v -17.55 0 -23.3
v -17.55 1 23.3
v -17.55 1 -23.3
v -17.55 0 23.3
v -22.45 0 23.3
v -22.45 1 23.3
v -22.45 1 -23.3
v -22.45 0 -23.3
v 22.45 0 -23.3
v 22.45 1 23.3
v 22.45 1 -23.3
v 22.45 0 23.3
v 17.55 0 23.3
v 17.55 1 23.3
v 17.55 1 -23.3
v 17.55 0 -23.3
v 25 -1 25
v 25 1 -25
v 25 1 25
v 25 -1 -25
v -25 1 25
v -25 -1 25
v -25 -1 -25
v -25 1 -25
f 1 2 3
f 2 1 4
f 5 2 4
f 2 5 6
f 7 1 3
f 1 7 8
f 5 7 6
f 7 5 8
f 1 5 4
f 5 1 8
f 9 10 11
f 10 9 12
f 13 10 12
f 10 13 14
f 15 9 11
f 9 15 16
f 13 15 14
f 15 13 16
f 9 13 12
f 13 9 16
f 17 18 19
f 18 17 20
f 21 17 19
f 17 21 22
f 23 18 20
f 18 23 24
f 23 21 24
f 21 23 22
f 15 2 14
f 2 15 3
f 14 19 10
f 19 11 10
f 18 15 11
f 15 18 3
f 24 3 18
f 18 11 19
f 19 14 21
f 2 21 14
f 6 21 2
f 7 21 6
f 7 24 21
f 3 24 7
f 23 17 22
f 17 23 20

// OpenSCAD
// file: ../../../modules/scad/roundedcube.scad
// More information: https://danielupshaw.com/openscad-rounded-corners/


// Examples
// color("Yellow")
// roundedcube(3, true, 0.7, "xmin");

// translate(v = [1, 0, 2])
// color("Pink")
// roundedcube([4, 2, 2], false, 0.6, "zmax");

// translate(v = [-4, -1, 2])
// color("Lightblue")
// roundedcube(2, false);

// translate(v = [0, 0, 6])
// color("Orange")
// roundedcube([3, 2, 2], true, 0.2);

// translate(v = [2.5, -0.5, 5])
// color("Green")
// roundedcube([3, 2, 2], false, 0.4, "z");

// Set to 0.01 for higher definition curves (renders slower)
$fs = 0.15;

module roundedcube(size = [1, 1, 1], center = false, radius = 0.5, apply_to = "all") {
	// If single value, convert to [x, y, z] vector
	size = (size[0] == undef) ? [size, size, size] : size;

	translate_min = radius;
	translate_xmax = size[0] - radius;
	translate_ymax = size[1] - radius;
	translate_zmax = size[2] - radius;

	diameter = radius * 2;

	obj_translate = (center == false) ?
		[0, 0, 0] : [
			-(size[0] / 2),
			-(size[1] / 2),
			-(size[2] / 2)
		];

	translate(v = obj_translate) {
		hull() {
			for (translate_x = [translate_min, translate_xmax]) {
				x_at = (translate_x == translate_min) ? "min" : "max";
				for (translate_y = [translate_min, translate_ymax]) {
					y_at = (translate_y == translate_min) ? "min" : "max";
					for (translate_z = [translate_min, translate_zmax]) {
						z_at = (translate_z == translate_min) ? "min" : "max";

						translate(v = [translate_x, translate_y, translate_z])
						if (
							(apply_to == "all") ||
							(apply_to == "xmin" && x_at == "min") || (apply_to == "xmax" && x_at == "max") ||
							(apply_to == "ymin" && y_at == "min") || (apply_to == "ymax" && y_at == "max") ||
							(apply_to == "zmin" && z_at == "min") || (apply_to == "zmax" && z_at == "max")
						) {
							sphere(r = radius);
						} else {
							rotate = 
								(apply_to == "xmin" || apply_to == "xmax" || apply_to == "x") ? [0, 90, 0] : (
								(apply_to == "ymin" || apply_to == "ymax" || apply_to == "y") ? [90, 90, 0] :
								[0, 0, 0]
							);
							rotate(a = rotate)
							cylinder(h = diameter, r = radius, center = true);
						}
					}
				}
			}
		}
	}
}
// file: IKEA Skadis v2 hook cutouts.scad
skadis_hook_width = 4.5;
skadis_hook_height = 46;
skadis_hole_spacing_width = 40; // middle to middle
cutout_tolerance_w = 0.4;
cutout_tolerance_h = 0.6;


module skadis_hook_cutout(center=false, hook_count=2) {
    
    if(center) {
        translate([-(skadis_hole_spacing_width + skadis_hook_width) / 2, 0, - skadis_hook_height / 2])
        object(hook_count);
    } else {
        object();
    }
    

}

module object(hook_count=2) {
    union() {

        // Cutout for the hook 1
        color("red")
        translate([- cutout_tolerance_w / 2, 0, - cutout_tolerance_h / 2])
        cube([skadis_hook_width + cutout_tolerance_w, 2, skadis_hook_height + cutout_tolerance_h]);

        // Cutout for the hook 2
        color("red")
        translate([- cutout_tolerance_w / 2 + skadis_hole_spacing_width, 0, - cutout_tolerance_h / 2])
        cube([skadis_hook_width + cutout_tolerance_w, 2, skadis_hook_height + cutout_tolerance_h]);

    }
}

skadis_hook_cutout(center = false);
// file: IKEA Skadis v2 hook.scad
$fn=20;

sh_height=43;
sh_width=4.5;
sh_hanger_spacing=5.5;
sh_material_size=2;
sh_short_tail=4;
sh_corner_radius = 0.8;

use <../../../modules/scad/roundedcube.scad>

module ikea_skadis_holder() {
    difference() {
        union() {
            
            //Vertical wall
            color("green")
            roundedcube(size = [sh_width,sh_material_size,sh_height], center = false, radius = sh_corner_radius, apply_to = "ymax");
            //cube([sh_width,sh_material_size,sh_height]);
            
            // Retainer
            color("blue")
            translate([0,0,sh_height-sh_hanger_spacing])
            roundedcube(size = [sh_width, sh_hanger_spacing + sh_material_size * 2 + 1, sh_hanger_spacing + 3], center = false, radius = sh_corner_radius, apply_to = "ymax");

            //Vertical wall connection (short)
            color("cyan")
            translate([0, sh_hanger_spacing + sh_material_size , sh_height - sh_hanger_spacing])
            roundedcube(size = [sh_width, sh_material_size + 1, 2], center = false, radius = sh_corner_radius, apply_to = "z");

            //Vertical wall (short)
            color("cyan")
            translate([0, sh_hanger_spacing + sh_material_size , sh_height - sh_short_tail - sh_hanger_spacing])
            //cube([sh_width,sh_material_size+1,sh_short_tail]);
            roundedcube(size = [sh_width, sh_material_size + 1, sh_short_tail], center = false, radius = sh_corner_radius, apply_to = "zmin");

            //Schnöpsel
            color("yellow")
            translate([0, sh_material_size - 2, 0])
            roundedcube(size = [sh_width, sh_hanger_spacing + 2, 8], center = false, radius = sh_corner_radius + 0.8, apply_to = "ymax");

            //Schnöpsel - Angleichen des unteren radius
            color("yellow")
            translate([0, sh_material_size - 2, 0])
            roundedcube(size = [sh_width, sh_hanger_spacing + 2, 7], center = false, radius = sh_corner_radius, apply_to = "ymax");

        }
        
        
    color("red")
    translate([-1,sh_material_size+sh_hanger_spacing/2,sh_height-sh_hanger_spacing])
    rotate([0,90,0])
    cylinder(sh_width+2, sh_hanger_spacing/2, sh_hanger_spacing/2);
        
    }
}
//color("Yellow")
ikea_skadis_holder();
// main file
$fn=100;

use <./IKEA Skadis v2 hook.scad>
use <./IKEA Skadis v2 hook cutouts.scad>

module ikea_skadis_backwall(_w, _h) {
    
    _w = _w >= 50  ? _w : 50;
    _h = _h >= 50  ? _h : 50;

    difference() {
        // backwall
        cube([_w, 2, _h], center = true);

       translate([0, 0, 0])
        skadis_hook_cutout(center=true);
    }


}

ikea_skadis_backwall(50, 50);
